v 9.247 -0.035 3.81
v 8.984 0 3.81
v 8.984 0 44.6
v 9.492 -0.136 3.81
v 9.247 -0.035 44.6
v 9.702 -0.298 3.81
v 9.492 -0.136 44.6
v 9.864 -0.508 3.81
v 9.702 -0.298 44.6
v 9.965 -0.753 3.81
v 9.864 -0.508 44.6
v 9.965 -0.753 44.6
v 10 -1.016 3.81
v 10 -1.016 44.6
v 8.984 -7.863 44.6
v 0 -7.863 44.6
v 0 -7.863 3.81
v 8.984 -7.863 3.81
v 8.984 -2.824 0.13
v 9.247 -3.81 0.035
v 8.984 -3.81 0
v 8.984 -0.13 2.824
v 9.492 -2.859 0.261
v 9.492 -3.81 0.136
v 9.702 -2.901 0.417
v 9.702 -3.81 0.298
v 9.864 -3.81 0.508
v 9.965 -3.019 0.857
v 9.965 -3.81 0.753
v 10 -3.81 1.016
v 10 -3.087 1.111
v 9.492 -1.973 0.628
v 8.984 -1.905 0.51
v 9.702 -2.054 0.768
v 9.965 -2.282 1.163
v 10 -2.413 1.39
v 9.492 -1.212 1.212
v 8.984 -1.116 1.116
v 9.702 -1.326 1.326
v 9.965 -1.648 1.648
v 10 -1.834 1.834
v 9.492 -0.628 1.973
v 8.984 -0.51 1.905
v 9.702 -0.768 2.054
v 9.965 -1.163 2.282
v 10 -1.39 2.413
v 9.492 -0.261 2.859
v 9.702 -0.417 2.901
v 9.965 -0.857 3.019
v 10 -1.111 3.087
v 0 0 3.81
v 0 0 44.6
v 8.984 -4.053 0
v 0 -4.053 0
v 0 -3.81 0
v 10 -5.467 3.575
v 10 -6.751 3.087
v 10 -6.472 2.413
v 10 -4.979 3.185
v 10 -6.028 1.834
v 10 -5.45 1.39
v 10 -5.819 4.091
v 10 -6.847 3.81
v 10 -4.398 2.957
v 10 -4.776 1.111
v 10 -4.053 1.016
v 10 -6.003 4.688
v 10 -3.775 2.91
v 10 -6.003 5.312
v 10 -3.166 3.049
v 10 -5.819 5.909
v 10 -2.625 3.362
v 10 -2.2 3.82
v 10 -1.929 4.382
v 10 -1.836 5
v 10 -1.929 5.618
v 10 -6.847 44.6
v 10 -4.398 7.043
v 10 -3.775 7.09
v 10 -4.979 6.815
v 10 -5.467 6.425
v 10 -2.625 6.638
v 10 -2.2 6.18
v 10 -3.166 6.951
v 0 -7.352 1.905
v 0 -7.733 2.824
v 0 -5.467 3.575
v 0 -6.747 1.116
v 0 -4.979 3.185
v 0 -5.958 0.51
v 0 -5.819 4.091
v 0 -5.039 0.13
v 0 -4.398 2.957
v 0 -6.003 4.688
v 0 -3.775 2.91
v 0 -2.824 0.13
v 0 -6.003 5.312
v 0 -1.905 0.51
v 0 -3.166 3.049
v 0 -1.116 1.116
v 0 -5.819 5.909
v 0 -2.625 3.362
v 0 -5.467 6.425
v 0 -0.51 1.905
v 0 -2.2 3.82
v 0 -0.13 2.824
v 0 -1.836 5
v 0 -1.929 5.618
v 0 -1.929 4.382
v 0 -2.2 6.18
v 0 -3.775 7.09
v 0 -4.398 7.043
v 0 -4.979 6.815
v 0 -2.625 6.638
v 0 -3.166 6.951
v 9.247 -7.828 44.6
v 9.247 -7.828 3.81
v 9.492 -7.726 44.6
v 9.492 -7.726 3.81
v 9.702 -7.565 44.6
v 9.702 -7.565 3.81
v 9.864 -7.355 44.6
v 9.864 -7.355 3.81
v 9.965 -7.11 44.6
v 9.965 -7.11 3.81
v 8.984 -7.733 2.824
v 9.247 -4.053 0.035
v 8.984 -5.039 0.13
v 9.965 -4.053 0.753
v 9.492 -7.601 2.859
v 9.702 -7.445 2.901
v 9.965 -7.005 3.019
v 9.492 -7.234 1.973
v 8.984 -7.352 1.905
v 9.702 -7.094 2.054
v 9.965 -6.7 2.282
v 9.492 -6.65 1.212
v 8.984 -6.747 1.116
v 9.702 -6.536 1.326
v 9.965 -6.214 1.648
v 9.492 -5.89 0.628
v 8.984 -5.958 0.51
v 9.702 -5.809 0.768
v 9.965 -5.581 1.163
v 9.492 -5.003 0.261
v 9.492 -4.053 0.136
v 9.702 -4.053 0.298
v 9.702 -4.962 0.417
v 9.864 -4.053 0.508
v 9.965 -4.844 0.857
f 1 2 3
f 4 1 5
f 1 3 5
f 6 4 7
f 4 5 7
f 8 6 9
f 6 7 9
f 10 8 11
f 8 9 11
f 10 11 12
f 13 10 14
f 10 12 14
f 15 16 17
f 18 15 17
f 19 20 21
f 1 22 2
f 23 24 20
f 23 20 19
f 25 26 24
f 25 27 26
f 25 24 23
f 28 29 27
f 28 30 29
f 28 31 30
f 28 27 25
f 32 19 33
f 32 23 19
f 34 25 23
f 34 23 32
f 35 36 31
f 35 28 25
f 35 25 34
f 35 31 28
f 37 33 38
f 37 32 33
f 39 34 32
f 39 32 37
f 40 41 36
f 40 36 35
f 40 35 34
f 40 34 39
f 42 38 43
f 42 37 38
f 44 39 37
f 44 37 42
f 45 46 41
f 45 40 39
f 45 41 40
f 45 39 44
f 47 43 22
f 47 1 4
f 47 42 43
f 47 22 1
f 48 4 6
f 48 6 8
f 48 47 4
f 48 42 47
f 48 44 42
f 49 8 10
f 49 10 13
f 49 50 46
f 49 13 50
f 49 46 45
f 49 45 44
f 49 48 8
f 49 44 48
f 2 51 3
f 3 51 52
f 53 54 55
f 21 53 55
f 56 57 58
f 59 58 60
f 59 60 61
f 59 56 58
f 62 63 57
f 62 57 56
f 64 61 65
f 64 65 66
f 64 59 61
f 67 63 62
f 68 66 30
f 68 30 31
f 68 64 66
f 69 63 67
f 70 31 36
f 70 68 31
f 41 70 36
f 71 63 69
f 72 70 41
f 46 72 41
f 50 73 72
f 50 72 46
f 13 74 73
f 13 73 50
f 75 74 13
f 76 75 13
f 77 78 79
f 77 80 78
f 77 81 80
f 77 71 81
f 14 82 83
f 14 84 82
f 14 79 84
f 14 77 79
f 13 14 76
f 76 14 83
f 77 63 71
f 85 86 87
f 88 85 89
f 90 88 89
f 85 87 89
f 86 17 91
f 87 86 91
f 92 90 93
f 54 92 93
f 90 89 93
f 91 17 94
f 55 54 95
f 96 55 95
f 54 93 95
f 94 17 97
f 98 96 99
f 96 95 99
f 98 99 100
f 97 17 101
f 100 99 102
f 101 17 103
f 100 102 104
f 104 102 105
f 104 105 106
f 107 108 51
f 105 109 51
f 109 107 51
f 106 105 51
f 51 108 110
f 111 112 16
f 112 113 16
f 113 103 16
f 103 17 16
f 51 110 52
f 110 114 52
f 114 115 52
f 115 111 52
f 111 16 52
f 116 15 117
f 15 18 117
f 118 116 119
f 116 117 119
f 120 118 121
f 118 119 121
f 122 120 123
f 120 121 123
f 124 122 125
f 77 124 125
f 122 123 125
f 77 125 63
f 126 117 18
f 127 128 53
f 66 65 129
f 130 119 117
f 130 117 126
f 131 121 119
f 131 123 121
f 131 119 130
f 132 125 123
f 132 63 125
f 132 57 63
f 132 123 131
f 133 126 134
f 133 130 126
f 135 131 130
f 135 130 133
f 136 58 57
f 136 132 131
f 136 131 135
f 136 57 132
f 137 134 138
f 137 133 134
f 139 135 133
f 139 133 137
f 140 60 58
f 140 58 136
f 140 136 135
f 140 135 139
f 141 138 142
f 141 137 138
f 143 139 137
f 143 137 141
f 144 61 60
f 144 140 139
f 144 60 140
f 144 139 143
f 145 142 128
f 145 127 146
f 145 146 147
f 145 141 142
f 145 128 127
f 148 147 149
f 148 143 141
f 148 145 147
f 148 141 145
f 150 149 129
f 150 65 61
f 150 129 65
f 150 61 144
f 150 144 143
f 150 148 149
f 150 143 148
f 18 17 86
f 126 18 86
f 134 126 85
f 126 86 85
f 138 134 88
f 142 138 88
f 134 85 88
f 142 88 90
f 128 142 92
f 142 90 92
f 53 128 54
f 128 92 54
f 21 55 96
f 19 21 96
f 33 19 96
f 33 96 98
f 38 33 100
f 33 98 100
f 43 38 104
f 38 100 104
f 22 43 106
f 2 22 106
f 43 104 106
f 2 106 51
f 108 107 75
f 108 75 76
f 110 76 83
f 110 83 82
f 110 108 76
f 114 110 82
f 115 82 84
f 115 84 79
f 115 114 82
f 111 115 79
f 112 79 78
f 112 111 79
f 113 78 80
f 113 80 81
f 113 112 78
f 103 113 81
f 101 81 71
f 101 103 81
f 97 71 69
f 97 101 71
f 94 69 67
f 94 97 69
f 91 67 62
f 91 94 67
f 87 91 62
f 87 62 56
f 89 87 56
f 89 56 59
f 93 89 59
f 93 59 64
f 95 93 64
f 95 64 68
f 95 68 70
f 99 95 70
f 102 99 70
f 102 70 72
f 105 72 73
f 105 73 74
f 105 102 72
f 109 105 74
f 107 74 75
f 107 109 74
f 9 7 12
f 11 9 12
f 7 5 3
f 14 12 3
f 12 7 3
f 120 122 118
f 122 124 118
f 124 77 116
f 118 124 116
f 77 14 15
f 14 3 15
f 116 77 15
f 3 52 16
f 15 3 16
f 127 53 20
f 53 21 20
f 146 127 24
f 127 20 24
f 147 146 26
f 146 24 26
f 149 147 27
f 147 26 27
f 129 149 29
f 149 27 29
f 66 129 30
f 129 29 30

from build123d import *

# Parameters (mm, degrees)
F0_R     = 2.0955
F1_DEPTH = 10
F2_R     = 1.016


with BuildPart() as f1:
    # F0 (on Right) → F1 (new body)
    with BuildSketch(Plane.YZ):
        with BuildLine():
            Line((-4.052595, 0), (-3.81, 0))
            ThreePointArc((-3.81, 0), (-1.115923, 1.115923), (0, 3.81))
            Line((0, 3.81), (0, 44.6))
            Line((0, 44.6), (-7.862595, 44.6))
            Line((-7.862595, 44.6), (-7.862595, 3.81))
            ThreePointArc((-7.862595, 3.81), (-6.746672, 1.115923), (-4.052595, 0))
        make_face()
        with Locations((-3.931298, 5)):
            Circle(F0_R, mode=Mode.SUBTRACT)
    extrude(amount=F1_DEPTH)

    # F2
    f2_edges = [f1.edges().sort_by_distance(p)[0] for p in [
        (10, 0, 24.205),
    ]]
    fillet(f2_edges, radius=F2_R)


solid = f1.part
